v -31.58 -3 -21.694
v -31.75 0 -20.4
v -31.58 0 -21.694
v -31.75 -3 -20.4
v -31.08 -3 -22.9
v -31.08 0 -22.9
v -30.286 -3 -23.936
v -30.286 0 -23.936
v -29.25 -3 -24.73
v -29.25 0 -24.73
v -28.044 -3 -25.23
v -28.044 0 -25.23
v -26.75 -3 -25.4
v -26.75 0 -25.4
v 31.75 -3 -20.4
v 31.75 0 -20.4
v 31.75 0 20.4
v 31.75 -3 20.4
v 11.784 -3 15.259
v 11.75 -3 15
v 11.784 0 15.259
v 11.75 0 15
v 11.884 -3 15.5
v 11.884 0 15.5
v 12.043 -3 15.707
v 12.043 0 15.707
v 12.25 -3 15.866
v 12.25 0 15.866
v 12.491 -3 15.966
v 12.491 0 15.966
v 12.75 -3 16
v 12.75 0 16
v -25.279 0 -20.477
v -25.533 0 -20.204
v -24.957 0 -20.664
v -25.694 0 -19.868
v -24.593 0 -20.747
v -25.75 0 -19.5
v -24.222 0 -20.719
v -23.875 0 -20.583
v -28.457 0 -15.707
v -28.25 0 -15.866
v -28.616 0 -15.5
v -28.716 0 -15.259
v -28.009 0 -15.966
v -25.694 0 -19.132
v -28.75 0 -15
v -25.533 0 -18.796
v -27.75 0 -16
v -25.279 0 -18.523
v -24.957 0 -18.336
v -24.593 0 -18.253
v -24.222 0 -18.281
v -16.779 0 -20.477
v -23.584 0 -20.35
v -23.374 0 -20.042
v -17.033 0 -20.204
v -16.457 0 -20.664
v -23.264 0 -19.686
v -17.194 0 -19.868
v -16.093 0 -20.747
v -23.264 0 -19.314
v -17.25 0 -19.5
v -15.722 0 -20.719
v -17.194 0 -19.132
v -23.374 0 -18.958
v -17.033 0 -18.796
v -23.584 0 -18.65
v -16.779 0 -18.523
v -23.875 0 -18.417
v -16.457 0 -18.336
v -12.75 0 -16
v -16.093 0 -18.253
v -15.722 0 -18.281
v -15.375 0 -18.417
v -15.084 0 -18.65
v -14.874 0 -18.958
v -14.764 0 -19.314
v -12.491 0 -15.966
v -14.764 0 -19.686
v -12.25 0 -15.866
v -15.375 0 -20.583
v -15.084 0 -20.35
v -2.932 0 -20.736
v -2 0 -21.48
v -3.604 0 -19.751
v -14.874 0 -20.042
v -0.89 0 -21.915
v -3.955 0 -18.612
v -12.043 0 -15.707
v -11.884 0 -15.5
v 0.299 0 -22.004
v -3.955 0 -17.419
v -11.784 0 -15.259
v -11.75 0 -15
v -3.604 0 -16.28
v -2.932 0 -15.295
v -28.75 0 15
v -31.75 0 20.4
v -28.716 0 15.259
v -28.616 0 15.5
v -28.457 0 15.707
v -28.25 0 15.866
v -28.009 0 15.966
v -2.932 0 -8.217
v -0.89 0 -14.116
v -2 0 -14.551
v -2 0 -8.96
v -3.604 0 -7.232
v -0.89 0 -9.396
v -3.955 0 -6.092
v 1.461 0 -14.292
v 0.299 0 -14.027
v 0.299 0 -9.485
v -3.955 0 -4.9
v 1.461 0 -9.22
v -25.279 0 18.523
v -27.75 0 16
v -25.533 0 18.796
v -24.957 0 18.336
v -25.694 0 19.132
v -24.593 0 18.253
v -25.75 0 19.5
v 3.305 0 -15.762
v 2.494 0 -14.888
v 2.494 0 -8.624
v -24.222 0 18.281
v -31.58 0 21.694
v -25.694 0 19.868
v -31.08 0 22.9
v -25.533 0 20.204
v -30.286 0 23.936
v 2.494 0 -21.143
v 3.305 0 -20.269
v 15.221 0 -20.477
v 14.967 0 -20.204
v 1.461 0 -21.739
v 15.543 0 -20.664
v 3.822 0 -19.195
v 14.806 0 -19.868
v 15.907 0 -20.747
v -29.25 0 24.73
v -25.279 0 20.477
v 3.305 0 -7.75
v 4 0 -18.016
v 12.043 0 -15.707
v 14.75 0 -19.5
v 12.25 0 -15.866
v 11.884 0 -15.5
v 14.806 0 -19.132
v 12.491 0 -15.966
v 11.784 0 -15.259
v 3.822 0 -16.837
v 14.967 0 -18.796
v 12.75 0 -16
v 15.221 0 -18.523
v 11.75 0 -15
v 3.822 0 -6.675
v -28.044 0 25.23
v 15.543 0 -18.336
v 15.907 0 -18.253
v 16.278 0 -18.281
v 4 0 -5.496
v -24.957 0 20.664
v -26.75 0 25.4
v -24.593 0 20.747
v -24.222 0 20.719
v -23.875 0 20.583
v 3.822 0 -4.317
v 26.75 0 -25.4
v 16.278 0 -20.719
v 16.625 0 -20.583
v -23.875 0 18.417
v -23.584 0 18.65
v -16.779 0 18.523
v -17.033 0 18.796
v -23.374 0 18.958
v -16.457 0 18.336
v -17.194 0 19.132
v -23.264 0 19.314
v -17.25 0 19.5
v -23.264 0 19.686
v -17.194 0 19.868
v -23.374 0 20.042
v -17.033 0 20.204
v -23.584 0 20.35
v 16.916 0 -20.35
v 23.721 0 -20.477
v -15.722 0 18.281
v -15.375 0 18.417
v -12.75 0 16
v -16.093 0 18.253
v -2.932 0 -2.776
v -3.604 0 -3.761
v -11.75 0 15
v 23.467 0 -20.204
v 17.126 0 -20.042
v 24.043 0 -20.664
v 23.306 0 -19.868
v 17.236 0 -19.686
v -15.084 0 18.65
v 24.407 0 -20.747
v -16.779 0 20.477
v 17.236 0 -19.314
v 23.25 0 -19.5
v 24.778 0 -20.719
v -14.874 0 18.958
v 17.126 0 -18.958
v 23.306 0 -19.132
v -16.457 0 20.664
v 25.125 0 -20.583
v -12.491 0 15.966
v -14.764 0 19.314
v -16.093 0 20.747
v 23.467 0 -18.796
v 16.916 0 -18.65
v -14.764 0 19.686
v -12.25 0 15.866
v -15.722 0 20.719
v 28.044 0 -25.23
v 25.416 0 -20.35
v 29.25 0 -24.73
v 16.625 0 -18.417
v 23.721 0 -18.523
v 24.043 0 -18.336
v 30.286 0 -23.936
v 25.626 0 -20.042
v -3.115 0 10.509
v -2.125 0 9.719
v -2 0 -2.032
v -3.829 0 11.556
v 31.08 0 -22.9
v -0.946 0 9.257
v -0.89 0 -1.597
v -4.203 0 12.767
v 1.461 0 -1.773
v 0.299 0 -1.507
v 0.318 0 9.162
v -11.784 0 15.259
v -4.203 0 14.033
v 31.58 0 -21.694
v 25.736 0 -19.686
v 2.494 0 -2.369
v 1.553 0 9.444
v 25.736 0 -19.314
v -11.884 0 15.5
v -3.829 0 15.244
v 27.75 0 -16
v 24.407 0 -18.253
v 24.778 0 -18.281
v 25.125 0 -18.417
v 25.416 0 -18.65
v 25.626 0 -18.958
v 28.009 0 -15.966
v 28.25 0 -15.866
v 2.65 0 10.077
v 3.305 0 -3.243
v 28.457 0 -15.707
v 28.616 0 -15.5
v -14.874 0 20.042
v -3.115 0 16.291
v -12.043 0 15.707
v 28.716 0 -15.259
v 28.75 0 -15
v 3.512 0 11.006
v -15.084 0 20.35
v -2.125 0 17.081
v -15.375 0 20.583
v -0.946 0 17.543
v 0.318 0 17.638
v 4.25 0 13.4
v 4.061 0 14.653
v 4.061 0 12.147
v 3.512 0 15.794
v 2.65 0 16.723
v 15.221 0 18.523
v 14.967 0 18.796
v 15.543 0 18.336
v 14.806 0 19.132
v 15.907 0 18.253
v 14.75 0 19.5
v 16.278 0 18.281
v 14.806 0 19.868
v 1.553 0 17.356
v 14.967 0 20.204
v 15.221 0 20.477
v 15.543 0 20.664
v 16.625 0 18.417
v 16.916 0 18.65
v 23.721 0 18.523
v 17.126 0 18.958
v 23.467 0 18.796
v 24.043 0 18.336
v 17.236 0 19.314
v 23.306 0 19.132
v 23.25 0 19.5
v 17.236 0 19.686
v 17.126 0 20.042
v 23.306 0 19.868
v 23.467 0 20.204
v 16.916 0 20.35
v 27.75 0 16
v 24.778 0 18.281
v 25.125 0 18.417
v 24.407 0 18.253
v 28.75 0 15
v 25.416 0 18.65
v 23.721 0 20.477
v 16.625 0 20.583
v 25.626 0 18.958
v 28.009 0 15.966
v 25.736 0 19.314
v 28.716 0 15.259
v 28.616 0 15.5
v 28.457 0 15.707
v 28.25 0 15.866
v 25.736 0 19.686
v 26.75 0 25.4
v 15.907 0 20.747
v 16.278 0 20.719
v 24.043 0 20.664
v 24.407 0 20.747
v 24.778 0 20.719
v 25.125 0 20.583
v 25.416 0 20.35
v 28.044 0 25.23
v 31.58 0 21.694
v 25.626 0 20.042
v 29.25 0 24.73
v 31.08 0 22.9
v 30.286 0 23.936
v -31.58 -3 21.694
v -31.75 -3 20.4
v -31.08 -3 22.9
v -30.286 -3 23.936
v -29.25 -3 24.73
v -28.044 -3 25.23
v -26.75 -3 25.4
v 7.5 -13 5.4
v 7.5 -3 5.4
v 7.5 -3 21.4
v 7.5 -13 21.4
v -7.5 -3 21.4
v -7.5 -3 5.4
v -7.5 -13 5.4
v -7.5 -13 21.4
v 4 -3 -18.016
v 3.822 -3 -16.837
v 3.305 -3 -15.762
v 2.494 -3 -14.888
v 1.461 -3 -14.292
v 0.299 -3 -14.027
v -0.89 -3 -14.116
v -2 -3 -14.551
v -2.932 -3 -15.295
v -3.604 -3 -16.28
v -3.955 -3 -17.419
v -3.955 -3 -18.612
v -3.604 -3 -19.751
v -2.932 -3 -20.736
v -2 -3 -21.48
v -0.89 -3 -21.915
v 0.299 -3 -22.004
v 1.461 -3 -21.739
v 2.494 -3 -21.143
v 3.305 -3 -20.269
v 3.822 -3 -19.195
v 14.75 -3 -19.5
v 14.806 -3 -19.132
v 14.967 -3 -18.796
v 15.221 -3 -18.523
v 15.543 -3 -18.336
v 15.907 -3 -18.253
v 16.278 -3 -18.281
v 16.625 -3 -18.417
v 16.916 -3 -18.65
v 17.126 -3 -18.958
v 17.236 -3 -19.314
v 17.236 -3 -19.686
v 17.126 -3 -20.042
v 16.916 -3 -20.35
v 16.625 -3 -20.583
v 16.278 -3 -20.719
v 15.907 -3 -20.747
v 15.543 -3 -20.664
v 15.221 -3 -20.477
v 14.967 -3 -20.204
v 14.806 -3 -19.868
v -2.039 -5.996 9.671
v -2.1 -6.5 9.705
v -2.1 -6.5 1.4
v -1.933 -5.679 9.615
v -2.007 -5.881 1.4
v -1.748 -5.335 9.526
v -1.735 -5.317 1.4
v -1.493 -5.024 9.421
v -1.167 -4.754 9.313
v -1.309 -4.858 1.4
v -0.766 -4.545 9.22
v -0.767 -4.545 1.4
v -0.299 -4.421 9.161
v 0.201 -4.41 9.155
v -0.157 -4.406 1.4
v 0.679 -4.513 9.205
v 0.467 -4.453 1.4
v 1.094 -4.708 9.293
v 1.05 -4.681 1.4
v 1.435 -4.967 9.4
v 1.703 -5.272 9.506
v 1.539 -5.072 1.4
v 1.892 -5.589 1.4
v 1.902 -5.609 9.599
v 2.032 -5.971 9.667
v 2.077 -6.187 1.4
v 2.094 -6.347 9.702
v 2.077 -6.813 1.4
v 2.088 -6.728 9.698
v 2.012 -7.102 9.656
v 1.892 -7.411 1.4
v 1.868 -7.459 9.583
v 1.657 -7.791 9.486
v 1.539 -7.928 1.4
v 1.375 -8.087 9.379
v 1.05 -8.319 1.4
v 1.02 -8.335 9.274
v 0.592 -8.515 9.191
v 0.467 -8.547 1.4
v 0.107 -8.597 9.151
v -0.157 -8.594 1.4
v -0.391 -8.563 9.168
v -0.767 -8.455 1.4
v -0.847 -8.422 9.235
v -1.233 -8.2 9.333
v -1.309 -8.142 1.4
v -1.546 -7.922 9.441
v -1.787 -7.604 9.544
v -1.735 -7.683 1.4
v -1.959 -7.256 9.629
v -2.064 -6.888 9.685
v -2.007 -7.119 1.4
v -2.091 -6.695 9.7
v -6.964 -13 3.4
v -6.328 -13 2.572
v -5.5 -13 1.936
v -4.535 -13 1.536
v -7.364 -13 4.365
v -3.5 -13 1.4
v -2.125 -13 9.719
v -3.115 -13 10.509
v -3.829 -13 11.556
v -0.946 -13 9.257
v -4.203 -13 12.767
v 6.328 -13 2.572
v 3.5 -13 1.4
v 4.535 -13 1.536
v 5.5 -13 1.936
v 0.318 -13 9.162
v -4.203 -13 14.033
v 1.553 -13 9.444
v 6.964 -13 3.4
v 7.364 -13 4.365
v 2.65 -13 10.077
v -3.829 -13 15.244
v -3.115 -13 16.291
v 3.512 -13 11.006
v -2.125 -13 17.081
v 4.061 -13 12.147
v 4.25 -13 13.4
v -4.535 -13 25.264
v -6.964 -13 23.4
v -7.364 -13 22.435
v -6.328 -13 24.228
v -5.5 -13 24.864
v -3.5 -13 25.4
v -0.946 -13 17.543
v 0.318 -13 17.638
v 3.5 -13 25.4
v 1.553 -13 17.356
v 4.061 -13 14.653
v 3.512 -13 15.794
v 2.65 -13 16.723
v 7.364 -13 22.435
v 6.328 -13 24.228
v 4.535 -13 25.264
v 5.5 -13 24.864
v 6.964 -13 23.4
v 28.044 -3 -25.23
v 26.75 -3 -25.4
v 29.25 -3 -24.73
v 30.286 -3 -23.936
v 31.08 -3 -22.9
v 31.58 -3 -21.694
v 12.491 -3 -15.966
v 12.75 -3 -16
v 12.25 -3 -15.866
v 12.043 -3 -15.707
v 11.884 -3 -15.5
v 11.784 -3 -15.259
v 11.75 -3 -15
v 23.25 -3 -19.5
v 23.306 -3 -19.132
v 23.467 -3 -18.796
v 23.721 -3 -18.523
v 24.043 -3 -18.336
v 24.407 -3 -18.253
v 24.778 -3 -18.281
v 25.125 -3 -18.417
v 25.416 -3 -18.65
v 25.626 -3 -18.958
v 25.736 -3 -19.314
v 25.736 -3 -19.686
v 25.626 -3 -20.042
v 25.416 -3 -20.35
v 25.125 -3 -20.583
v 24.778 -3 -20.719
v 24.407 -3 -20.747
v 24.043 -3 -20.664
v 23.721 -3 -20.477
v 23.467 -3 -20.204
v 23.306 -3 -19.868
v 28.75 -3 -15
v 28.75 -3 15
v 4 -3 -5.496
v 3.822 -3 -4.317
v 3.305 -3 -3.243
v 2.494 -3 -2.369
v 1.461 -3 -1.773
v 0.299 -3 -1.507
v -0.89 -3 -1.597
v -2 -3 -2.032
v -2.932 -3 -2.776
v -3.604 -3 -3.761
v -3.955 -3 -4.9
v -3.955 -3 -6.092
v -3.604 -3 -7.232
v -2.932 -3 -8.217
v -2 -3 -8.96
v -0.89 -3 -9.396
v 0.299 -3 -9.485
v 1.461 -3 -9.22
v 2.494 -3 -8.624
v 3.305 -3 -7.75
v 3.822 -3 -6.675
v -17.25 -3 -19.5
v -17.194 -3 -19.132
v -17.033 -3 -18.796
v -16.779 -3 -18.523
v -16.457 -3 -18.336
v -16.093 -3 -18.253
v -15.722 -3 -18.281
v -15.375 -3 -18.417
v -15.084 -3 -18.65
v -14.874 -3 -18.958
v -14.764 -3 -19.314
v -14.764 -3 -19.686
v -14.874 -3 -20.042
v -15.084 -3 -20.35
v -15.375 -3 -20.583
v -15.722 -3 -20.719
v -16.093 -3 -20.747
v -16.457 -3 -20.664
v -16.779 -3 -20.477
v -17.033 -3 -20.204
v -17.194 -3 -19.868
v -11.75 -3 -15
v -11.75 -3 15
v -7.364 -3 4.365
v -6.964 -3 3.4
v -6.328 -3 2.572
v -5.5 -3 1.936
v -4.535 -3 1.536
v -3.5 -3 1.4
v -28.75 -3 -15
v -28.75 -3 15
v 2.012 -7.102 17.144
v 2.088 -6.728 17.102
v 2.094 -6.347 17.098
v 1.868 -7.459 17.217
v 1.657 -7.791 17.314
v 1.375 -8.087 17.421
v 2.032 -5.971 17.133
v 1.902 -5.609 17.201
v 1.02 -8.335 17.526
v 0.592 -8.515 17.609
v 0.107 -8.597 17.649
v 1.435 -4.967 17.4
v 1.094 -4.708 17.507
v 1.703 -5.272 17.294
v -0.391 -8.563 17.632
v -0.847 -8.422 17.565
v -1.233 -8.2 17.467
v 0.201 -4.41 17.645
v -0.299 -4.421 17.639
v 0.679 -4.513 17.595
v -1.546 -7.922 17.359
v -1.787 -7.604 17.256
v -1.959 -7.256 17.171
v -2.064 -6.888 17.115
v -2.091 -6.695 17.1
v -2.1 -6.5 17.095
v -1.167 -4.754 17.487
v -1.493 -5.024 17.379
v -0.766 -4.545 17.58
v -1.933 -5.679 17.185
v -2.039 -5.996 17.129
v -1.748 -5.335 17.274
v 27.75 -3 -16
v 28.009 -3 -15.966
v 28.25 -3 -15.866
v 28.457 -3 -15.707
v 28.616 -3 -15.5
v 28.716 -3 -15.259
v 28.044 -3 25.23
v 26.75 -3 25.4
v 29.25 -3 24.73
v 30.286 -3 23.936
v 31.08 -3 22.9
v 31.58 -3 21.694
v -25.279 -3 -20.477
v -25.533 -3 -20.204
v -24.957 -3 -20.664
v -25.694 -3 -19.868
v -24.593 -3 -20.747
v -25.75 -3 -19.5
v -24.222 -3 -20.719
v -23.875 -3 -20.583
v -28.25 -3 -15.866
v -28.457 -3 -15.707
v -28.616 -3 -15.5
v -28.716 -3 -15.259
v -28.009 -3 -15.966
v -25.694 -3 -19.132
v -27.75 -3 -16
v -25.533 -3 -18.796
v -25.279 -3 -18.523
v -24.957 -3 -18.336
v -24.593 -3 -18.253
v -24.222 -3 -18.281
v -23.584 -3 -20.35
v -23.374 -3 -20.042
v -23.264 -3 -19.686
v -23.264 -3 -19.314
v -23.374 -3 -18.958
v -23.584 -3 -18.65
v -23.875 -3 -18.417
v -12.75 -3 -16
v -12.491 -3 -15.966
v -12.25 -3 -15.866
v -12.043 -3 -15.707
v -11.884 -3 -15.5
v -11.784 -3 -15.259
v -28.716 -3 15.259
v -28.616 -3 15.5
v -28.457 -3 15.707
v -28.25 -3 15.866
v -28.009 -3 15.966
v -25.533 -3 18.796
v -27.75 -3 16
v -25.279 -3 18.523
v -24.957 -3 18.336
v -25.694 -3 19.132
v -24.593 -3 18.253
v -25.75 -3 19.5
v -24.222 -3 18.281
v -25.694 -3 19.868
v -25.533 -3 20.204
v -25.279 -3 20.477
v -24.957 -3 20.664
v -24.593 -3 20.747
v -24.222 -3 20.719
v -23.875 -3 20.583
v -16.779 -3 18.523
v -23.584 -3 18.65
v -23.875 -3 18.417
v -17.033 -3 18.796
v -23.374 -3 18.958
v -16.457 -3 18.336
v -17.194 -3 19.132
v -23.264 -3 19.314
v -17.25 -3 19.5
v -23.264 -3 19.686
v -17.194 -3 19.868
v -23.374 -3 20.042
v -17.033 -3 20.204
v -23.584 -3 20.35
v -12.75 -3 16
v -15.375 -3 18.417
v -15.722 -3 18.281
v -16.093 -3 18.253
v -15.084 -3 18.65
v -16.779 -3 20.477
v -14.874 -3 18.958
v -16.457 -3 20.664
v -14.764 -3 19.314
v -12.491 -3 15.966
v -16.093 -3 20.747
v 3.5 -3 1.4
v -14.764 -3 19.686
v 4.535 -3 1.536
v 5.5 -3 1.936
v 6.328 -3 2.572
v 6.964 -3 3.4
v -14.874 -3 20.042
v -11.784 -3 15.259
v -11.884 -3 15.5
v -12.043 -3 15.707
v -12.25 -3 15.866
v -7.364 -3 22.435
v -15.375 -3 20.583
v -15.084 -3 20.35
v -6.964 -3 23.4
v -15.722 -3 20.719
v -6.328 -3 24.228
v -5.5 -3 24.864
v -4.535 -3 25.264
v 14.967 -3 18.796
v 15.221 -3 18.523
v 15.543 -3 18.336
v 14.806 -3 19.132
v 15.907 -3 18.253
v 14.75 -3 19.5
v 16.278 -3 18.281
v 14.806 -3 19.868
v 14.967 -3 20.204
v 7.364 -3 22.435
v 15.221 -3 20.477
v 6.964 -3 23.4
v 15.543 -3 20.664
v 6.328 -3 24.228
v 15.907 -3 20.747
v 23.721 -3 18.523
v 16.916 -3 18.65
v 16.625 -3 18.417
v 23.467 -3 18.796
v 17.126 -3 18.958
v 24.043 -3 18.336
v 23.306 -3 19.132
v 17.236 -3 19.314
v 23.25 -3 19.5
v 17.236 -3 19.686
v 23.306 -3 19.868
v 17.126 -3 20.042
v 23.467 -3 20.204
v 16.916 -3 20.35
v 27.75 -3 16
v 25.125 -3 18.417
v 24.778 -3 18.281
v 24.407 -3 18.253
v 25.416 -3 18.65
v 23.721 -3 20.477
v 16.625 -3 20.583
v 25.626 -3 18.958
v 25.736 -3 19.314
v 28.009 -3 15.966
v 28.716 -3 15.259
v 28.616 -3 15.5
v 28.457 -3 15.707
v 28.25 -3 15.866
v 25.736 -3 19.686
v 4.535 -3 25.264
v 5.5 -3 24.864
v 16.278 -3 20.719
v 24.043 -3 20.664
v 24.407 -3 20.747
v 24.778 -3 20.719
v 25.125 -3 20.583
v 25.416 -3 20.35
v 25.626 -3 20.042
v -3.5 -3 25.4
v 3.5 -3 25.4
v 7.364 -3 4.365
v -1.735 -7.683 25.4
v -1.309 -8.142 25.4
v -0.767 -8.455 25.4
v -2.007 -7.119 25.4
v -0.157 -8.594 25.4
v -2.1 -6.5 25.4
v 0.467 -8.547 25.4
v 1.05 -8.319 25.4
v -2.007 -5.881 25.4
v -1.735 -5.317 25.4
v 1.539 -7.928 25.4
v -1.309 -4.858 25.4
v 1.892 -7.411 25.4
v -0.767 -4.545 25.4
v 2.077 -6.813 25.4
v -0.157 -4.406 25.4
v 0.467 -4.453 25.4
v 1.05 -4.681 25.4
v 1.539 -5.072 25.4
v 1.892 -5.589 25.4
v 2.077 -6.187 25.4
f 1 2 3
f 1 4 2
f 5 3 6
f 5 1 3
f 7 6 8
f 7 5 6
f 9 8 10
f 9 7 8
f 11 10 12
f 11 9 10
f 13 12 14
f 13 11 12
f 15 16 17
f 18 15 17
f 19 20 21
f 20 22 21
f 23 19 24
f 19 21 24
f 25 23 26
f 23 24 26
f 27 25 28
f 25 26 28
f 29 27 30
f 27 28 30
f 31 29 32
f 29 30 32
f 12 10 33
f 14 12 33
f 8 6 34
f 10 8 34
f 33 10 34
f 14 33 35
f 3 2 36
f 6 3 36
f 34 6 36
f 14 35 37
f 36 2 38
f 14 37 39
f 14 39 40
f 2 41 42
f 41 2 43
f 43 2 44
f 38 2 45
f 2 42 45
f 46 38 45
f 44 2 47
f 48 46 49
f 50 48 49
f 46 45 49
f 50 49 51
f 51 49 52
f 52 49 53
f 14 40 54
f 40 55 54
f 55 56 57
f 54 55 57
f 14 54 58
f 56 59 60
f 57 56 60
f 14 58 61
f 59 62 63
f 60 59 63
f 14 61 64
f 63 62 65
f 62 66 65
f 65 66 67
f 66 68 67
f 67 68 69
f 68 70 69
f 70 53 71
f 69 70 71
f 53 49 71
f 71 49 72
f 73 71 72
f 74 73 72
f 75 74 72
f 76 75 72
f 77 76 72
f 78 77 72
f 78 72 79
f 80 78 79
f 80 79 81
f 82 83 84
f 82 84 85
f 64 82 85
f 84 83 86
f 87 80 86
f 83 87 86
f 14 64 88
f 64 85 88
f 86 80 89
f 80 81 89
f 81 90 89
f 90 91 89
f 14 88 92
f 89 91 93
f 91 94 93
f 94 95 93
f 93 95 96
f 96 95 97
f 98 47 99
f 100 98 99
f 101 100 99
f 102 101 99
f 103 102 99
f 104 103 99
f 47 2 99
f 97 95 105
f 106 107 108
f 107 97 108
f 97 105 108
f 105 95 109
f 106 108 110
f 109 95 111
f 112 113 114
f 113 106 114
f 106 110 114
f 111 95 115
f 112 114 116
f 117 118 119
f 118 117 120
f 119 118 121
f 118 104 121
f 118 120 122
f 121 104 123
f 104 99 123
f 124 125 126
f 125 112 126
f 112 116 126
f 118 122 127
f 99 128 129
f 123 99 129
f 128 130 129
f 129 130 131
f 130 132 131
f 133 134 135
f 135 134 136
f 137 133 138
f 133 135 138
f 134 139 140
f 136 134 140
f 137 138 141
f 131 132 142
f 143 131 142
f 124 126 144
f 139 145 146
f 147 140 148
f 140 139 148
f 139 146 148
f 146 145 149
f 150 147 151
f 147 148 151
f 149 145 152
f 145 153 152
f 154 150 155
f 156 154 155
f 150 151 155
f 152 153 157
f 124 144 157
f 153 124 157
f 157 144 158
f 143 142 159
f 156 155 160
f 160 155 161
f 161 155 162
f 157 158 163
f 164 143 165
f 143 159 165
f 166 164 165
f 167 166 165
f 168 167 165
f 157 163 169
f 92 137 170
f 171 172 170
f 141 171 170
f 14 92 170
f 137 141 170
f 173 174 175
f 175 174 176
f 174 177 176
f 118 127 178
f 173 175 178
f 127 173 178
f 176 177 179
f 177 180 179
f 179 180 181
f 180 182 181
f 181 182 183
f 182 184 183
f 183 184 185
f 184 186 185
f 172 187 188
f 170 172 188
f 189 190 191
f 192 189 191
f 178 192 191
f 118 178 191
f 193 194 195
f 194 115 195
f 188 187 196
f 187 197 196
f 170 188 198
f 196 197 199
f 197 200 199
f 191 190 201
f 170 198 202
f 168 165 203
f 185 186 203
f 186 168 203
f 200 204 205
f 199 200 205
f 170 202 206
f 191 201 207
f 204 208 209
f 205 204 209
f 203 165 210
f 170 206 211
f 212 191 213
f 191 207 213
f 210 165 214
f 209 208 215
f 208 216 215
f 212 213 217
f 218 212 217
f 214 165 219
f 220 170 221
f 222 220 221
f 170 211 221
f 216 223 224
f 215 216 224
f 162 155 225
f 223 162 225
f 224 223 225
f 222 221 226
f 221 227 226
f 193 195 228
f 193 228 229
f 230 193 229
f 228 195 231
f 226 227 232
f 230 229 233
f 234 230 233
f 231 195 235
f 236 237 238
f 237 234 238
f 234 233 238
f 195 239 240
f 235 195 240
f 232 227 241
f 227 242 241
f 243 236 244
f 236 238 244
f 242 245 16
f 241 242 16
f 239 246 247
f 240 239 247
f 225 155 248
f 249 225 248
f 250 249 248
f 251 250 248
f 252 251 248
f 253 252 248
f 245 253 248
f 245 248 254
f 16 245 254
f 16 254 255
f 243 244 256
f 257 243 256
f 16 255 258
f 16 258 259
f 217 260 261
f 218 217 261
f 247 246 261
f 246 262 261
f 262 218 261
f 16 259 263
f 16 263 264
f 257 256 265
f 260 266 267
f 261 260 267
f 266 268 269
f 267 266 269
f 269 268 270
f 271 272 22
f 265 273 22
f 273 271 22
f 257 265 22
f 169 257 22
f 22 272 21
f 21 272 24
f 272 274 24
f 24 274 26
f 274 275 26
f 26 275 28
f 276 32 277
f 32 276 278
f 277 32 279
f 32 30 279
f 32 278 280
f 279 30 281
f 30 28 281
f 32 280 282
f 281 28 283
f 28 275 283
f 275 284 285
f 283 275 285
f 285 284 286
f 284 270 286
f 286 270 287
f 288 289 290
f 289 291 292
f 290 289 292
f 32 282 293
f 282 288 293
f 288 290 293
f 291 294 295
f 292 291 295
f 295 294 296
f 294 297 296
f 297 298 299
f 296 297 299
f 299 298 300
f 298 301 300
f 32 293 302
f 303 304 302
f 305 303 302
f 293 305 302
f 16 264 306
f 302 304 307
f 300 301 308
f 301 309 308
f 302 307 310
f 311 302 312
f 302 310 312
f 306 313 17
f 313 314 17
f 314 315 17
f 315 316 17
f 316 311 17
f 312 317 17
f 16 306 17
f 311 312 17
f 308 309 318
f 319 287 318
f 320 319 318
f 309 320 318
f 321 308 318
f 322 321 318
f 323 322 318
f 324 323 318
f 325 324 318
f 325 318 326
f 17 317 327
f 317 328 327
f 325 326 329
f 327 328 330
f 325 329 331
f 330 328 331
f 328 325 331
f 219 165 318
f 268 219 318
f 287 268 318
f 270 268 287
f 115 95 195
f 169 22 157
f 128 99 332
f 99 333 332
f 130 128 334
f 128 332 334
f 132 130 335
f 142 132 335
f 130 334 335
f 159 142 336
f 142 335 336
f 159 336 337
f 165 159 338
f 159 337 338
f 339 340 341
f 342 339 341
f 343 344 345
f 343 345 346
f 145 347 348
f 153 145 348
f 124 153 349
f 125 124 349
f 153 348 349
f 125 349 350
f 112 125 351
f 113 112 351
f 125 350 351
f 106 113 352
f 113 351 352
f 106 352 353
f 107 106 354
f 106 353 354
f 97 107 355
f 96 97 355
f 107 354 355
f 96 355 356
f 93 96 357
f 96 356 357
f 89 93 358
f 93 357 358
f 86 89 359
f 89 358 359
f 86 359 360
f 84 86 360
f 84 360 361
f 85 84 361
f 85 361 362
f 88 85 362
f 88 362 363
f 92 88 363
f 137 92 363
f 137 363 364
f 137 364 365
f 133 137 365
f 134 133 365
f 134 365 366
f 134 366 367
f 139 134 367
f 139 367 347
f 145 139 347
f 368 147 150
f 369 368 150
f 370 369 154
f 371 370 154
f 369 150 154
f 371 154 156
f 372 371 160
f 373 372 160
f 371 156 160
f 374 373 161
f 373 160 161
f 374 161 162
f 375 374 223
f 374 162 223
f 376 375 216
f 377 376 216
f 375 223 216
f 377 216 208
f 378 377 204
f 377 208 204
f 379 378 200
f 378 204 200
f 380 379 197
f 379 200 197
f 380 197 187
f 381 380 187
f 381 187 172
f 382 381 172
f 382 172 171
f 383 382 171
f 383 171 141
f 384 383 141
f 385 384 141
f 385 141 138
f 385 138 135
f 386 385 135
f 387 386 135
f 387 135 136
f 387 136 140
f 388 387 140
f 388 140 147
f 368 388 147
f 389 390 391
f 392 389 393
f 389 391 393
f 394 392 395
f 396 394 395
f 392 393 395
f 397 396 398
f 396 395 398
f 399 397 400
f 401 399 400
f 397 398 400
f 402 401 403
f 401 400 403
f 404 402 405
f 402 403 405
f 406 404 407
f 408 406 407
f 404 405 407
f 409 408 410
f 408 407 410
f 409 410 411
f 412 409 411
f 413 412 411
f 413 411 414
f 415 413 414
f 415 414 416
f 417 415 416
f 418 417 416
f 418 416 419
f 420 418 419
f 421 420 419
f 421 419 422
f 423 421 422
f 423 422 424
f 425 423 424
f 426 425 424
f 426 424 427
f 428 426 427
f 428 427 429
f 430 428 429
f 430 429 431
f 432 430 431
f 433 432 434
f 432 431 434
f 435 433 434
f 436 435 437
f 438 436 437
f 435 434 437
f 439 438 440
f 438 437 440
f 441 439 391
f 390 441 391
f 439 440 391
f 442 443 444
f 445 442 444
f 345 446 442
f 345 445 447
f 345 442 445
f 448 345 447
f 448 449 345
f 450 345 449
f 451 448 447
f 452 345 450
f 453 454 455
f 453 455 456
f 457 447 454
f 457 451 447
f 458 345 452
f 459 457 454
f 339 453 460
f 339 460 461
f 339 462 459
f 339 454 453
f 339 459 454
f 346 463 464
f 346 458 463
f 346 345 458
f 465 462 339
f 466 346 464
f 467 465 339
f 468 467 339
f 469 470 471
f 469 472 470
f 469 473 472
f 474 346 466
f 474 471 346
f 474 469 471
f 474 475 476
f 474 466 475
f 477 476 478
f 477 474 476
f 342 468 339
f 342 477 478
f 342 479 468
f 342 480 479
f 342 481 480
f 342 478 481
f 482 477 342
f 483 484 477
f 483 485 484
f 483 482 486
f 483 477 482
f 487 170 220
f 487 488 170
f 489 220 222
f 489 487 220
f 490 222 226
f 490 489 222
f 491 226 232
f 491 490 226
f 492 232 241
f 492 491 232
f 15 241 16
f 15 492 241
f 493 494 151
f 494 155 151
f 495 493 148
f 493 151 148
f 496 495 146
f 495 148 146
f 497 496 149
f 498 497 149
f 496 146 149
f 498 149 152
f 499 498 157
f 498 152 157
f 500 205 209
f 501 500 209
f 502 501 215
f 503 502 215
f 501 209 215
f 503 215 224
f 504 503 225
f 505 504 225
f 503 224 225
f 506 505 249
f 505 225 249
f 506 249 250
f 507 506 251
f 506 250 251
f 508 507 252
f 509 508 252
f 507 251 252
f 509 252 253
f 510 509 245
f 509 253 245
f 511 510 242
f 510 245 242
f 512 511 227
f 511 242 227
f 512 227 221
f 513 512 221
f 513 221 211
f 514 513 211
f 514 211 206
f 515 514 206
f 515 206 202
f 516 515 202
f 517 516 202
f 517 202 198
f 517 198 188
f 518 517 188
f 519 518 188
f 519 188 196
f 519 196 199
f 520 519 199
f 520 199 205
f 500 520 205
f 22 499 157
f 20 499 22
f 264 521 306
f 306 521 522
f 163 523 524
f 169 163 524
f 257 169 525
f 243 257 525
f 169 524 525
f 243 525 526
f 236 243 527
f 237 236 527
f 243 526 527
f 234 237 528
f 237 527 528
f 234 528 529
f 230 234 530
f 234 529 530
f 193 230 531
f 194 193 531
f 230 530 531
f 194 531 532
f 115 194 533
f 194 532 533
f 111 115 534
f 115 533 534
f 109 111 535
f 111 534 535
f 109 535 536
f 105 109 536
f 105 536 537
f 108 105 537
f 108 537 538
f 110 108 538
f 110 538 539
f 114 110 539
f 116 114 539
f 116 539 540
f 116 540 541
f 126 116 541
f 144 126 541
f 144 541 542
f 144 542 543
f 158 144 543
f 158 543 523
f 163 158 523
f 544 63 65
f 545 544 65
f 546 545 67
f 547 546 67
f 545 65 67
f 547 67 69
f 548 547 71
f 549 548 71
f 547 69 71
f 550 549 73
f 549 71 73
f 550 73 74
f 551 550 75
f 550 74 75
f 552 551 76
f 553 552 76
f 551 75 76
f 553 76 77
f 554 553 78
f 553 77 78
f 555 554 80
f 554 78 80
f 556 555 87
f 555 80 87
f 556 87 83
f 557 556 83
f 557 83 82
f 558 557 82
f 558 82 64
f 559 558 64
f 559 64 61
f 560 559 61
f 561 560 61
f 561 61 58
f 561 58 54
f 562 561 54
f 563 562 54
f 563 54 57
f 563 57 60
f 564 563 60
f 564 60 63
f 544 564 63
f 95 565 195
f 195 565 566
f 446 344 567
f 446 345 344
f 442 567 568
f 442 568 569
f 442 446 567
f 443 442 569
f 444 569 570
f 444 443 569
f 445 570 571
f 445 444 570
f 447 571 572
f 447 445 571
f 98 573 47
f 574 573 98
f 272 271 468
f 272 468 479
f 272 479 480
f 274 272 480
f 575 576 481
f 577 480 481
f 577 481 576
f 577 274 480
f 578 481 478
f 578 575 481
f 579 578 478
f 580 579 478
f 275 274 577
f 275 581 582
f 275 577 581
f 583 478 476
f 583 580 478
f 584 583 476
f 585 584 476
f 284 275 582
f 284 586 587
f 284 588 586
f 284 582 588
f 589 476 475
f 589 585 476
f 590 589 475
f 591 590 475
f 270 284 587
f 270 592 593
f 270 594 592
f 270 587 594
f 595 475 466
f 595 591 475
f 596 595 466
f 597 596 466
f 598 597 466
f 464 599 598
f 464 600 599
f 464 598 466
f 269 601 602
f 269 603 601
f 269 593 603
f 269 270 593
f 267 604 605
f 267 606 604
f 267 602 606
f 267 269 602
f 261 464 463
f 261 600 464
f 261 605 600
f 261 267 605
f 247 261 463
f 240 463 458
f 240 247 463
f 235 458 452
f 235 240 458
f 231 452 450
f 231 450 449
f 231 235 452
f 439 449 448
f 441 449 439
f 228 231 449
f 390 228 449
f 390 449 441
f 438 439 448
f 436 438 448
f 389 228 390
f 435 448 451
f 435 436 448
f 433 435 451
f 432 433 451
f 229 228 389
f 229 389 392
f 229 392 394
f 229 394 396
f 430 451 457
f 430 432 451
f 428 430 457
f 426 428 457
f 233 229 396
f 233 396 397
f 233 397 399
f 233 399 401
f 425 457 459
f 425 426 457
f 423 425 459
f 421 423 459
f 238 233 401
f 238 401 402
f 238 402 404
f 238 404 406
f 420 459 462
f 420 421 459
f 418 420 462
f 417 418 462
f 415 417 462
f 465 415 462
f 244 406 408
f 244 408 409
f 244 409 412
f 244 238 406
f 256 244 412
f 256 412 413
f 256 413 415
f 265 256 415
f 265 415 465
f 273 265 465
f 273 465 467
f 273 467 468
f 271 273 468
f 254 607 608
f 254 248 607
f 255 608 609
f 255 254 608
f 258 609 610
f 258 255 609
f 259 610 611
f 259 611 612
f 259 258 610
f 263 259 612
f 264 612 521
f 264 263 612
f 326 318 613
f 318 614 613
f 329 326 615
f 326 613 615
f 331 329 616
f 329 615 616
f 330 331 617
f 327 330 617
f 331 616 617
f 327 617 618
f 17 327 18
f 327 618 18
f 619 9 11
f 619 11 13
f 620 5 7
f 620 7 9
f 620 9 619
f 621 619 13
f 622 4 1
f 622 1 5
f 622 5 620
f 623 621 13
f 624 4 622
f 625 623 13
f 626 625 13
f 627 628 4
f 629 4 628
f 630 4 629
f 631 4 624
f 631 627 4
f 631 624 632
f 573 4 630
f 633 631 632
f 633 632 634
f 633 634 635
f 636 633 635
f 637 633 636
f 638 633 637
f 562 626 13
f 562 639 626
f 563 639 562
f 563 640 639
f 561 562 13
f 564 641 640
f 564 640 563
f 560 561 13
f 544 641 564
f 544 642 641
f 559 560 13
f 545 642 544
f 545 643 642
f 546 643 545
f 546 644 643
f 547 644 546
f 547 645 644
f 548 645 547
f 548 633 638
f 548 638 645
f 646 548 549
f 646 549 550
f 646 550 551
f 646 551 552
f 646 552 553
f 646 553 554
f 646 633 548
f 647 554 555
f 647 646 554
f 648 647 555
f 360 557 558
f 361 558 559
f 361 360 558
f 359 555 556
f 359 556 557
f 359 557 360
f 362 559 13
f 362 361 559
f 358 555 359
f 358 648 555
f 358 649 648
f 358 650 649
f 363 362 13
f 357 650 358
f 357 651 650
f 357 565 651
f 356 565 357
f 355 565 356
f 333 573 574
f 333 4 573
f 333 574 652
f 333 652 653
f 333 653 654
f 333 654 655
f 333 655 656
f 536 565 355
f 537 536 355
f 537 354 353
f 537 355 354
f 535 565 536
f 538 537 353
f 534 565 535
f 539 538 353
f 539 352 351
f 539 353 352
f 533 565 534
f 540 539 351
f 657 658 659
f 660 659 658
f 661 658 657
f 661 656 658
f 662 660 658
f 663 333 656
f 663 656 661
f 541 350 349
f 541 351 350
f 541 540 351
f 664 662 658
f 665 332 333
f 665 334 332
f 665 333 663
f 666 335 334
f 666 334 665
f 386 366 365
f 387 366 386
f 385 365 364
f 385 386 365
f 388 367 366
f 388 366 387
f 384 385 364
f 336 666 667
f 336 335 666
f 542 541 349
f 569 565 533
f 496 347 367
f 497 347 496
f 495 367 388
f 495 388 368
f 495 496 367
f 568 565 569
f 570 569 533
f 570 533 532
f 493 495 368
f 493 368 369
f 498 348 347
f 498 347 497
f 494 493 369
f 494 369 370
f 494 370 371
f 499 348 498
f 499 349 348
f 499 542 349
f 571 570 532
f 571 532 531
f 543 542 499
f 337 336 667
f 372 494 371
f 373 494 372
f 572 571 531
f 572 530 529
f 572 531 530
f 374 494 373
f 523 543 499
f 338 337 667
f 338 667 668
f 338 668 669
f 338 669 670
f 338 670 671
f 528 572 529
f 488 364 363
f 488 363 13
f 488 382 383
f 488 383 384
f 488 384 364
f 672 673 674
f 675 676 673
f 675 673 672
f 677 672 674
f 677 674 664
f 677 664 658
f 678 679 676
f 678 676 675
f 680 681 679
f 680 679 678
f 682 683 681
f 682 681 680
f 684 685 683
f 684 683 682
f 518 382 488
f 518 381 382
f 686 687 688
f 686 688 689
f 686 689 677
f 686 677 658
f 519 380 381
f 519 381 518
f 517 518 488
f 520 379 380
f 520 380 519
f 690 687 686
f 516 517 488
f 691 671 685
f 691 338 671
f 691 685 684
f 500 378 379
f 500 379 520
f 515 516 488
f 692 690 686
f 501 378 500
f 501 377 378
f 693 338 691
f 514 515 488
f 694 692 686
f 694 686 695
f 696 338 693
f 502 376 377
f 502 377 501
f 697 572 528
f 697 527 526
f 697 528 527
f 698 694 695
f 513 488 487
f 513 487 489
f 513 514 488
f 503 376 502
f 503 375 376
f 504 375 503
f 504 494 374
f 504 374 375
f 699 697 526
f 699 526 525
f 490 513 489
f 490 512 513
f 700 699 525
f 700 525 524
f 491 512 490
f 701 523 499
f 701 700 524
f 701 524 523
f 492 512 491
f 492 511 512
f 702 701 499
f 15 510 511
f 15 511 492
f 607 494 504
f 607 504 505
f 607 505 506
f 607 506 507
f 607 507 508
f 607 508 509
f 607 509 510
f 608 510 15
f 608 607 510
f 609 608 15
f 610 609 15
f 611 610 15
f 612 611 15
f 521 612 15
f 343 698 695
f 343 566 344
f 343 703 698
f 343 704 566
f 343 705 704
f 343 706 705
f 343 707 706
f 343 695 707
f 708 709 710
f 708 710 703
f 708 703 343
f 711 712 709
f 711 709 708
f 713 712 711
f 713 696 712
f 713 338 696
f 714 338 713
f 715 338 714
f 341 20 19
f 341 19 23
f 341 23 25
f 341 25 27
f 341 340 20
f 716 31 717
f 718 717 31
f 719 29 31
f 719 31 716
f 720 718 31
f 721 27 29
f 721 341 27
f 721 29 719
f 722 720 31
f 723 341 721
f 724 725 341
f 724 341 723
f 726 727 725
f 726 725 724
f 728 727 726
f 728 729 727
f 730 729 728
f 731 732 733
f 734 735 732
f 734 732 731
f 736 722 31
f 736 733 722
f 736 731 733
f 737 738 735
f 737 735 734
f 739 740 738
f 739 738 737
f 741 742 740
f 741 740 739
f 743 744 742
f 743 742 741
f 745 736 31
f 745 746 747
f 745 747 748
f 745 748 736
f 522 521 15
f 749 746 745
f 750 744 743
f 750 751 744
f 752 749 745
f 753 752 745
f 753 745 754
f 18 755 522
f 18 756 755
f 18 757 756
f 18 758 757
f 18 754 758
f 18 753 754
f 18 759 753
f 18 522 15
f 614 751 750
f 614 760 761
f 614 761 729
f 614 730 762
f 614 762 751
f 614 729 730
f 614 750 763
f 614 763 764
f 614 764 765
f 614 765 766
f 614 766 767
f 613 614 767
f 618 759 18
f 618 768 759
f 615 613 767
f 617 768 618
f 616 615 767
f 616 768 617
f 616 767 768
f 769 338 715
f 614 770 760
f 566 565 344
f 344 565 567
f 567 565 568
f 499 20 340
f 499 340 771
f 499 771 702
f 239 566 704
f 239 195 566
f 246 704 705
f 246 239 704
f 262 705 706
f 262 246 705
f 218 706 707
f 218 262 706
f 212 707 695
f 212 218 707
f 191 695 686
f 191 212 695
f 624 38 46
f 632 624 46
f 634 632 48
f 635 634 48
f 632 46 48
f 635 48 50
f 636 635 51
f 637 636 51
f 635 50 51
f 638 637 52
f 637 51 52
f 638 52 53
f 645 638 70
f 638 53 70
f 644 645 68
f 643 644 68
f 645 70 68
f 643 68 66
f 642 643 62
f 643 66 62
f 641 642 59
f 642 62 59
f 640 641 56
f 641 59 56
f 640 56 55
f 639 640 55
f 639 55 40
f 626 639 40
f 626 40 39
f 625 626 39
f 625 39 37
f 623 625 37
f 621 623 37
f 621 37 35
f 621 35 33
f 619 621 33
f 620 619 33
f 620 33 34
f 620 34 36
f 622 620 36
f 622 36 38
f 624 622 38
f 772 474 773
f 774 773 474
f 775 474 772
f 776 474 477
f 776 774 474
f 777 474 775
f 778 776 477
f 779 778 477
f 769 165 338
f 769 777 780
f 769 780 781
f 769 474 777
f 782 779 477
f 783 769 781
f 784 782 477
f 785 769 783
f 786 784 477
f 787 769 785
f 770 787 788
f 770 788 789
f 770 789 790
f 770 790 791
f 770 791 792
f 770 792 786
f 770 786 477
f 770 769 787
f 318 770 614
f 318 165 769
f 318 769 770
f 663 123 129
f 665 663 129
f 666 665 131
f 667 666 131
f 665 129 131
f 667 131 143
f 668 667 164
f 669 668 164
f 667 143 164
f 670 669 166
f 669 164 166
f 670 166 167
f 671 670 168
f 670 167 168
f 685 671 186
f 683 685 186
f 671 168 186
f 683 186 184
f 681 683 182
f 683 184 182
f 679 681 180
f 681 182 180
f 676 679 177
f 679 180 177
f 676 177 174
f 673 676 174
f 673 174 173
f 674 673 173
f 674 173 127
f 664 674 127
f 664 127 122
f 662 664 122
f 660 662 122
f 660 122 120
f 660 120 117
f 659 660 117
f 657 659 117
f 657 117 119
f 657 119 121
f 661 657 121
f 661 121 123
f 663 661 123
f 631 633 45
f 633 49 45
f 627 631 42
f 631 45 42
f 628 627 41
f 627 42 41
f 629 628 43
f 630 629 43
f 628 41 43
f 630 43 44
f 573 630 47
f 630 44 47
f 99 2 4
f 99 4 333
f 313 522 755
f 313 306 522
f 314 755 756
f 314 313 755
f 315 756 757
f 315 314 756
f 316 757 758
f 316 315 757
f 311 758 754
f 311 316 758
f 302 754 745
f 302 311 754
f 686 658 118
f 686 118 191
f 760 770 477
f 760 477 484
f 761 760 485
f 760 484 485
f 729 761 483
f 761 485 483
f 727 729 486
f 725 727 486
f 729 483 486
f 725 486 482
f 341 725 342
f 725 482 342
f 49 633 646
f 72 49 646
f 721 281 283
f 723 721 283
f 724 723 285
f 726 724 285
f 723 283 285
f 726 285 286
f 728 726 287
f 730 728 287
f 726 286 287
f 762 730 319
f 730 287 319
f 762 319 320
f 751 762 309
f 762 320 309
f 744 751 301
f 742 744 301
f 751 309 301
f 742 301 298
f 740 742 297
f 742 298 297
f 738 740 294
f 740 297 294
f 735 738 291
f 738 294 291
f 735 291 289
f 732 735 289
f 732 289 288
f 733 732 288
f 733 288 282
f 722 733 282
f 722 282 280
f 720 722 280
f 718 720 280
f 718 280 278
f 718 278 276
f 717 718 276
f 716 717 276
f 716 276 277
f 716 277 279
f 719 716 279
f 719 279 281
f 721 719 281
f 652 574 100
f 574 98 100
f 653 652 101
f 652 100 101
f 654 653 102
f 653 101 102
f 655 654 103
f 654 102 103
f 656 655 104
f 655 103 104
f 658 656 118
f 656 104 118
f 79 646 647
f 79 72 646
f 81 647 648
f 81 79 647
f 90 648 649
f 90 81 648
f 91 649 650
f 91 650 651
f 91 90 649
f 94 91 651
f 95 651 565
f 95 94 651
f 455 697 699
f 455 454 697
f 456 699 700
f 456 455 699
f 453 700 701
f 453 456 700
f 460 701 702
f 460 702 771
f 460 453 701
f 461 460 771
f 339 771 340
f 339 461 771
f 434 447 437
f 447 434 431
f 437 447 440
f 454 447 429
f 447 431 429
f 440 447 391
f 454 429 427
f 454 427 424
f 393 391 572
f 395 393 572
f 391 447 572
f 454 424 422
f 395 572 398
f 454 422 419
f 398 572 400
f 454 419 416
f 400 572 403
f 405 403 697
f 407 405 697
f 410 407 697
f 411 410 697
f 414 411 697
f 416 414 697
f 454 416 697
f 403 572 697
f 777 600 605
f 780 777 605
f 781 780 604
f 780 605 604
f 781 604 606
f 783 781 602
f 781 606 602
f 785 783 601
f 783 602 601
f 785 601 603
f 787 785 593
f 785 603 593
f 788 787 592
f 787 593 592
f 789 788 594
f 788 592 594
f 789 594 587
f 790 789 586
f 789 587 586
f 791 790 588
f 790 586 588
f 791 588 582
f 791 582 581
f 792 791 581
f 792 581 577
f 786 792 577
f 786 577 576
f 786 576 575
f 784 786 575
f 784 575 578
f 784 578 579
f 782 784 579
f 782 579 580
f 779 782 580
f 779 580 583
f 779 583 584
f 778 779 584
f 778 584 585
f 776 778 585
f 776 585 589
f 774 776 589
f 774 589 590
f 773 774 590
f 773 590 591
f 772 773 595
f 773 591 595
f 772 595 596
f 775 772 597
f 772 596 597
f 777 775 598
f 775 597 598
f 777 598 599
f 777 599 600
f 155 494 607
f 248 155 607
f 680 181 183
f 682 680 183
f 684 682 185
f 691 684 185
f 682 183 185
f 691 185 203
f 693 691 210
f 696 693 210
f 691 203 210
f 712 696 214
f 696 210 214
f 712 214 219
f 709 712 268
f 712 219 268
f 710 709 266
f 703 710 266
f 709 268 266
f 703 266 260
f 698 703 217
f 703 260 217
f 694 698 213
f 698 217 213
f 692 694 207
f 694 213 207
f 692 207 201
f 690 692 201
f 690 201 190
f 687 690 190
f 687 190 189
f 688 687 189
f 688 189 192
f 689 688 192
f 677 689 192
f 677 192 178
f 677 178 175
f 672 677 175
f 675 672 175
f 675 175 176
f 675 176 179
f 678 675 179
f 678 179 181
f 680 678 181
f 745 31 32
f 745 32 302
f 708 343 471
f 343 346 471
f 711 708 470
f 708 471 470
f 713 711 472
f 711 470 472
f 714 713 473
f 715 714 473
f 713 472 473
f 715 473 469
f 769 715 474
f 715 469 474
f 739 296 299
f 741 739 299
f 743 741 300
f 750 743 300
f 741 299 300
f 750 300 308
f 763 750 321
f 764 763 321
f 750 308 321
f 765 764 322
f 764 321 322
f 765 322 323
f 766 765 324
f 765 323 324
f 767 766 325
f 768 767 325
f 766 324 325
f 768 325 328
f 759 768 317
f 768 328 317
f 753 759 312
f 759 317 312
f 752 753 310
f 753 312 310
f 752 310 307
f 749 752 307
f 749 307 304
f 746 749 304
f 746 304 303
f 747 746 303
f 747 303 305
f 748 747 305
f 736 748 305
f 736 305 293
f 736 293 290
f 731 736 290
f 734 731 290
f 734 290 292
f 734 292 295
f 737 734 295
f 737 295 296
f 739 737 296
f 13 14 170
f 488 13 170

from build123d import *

# Parameters (mm, degrees)
F0_W      = 63.5
F0_H      = 50.8
F0_R      = 4.25
F1_DEPTH  = 3
F2_W      = 17
F2_H      = 32
F3_DEPTH  = 3.001
F4_R      = 5
F5_W      = 15
F5_H      = 24
F5_R      = 4.25
F6_DEPTH  = 10
F8_D      = 4.2
F9_R      = 4
F10_R     = 4
F11_DEPTH = 3.0010001
F12_R     = 1.25
F13_DEPTH = 13.0010001
F14_R     = 1


with BuildPart() as f1:
    # F0 (on Front) → F1 (new body)
    with BuildSketch(Plane.XZ):
        Rectangle(F0_W, F0_H)
        with Locations((0, 13.4)):
            Circle(F0_R, mode=Mode.SUBTRACT)
    extrude(amount=F1_DEPTH)

    # F2 (on face) → F3 (cut, through all)
    with BuildSketch(Plane.XZ.offset(3)):
        with Locations((20.25, 0)):
            Rectangle(F2_W, F2_H)
        with Locations((-20.25, 0)):
            Rectangle(F2_W, F2_H)
    extrude(amount=-F3_DEPTH, mode=Mode.SUBTRACT)

    # F4
    f4_edges = [f1.edges().sort_by_distance(p)[0] for p in [
        (-31.75, -1.5, 25.4),
        (31.75, -1.5, 25.4),
        (31.75, -1.5, -25.4),
        (-31.75, -1.5, -25.4),
    ]]
    fillet(f4_edges, radius=F4_R)

    # F5 (on face) → F6 (join)
    with BuildSketch(Plane.XZ.offset(3)):
        with Locations((0, 13.4)):
            Rectangle(F5_W, F5_H)
        with Locations((0, 13.4)):
            Circle(F5_R, mode=Mode.SUBTRACT)
    extrude(amount=F6_DEPTH)

    # F8 (through all)
    with Locations(Plane.XY.offset(25.4)):
        with Locations((0, -6.5)):
            Hole(F8_D / 2)

    # F9
    f9_edges = [f1.edges().sort_by_distance(p)[0] for p in [
        (-7.5, -8, 1.4),
        (7.5, -8, 1.4),
        (7.5, -8, 25.4),
        (-7.5, -8, 25.4),
    ]]
    fillet(f9_edges, radius=F9_R)

    # F10 (on face) → F11 (cut, through all)
    with BuildSketch(Plane.XZ.offset(3)):
        with Locations((0, -5.4962742142)):
            Circle(F10_R)
        with Locations((0, -18.0155653507)):
            Circle(F10_R)
    extrude(amount=-F11_DEPTH, mode=Mode.SUBTRACT)

    # F12 (on face) → F13 (cut, through all)
    with BuildSketch(Plane(origin=(0, 0, 0), x_dir=(-1, 0, 0), z_dir=(0, 1, 0))):
        with Locations((-24.5, 19.5)):
            Circle(F12_R)
        with Locations((-16, 19.5)):
            Circle(F12_R)
        with Locations((16, 19.5)):
            Circle(F12_R)
        with Locations((24.5, 19.5)):
            Circle(F12_R)
        with Locations((-24.5, -19.5)):
            Circle(F12_R)
        with Locations((-16, -19.5)):
            Circle(F12_R)
        with Locations((16, -19.5)):
            Circle(F12_R)
        with Locations((24.5, -19.5)):
            Circle(F12_R)
    extrude(amount=-F13_DEPTH, mode=Mode.SUBTRACT)

    # F14
    f14_edges = [f1.edges().sort_by_distance(p)[0] for p in [
        (28.75, -1.5, 16),
        (-11.75, -1.5, 16),
        (11.75, -1.5, 16),
        (-28.75, -1.5, 16),
        (-28.75, -1.5, -16),
        (11.75, -1.5, -16),
        (-11.75, -1.5, -16),
        (28.75, -1.5, -16),
    ]]
    fillet(f14_edges, radius=F14_R)


solid = f1.part
